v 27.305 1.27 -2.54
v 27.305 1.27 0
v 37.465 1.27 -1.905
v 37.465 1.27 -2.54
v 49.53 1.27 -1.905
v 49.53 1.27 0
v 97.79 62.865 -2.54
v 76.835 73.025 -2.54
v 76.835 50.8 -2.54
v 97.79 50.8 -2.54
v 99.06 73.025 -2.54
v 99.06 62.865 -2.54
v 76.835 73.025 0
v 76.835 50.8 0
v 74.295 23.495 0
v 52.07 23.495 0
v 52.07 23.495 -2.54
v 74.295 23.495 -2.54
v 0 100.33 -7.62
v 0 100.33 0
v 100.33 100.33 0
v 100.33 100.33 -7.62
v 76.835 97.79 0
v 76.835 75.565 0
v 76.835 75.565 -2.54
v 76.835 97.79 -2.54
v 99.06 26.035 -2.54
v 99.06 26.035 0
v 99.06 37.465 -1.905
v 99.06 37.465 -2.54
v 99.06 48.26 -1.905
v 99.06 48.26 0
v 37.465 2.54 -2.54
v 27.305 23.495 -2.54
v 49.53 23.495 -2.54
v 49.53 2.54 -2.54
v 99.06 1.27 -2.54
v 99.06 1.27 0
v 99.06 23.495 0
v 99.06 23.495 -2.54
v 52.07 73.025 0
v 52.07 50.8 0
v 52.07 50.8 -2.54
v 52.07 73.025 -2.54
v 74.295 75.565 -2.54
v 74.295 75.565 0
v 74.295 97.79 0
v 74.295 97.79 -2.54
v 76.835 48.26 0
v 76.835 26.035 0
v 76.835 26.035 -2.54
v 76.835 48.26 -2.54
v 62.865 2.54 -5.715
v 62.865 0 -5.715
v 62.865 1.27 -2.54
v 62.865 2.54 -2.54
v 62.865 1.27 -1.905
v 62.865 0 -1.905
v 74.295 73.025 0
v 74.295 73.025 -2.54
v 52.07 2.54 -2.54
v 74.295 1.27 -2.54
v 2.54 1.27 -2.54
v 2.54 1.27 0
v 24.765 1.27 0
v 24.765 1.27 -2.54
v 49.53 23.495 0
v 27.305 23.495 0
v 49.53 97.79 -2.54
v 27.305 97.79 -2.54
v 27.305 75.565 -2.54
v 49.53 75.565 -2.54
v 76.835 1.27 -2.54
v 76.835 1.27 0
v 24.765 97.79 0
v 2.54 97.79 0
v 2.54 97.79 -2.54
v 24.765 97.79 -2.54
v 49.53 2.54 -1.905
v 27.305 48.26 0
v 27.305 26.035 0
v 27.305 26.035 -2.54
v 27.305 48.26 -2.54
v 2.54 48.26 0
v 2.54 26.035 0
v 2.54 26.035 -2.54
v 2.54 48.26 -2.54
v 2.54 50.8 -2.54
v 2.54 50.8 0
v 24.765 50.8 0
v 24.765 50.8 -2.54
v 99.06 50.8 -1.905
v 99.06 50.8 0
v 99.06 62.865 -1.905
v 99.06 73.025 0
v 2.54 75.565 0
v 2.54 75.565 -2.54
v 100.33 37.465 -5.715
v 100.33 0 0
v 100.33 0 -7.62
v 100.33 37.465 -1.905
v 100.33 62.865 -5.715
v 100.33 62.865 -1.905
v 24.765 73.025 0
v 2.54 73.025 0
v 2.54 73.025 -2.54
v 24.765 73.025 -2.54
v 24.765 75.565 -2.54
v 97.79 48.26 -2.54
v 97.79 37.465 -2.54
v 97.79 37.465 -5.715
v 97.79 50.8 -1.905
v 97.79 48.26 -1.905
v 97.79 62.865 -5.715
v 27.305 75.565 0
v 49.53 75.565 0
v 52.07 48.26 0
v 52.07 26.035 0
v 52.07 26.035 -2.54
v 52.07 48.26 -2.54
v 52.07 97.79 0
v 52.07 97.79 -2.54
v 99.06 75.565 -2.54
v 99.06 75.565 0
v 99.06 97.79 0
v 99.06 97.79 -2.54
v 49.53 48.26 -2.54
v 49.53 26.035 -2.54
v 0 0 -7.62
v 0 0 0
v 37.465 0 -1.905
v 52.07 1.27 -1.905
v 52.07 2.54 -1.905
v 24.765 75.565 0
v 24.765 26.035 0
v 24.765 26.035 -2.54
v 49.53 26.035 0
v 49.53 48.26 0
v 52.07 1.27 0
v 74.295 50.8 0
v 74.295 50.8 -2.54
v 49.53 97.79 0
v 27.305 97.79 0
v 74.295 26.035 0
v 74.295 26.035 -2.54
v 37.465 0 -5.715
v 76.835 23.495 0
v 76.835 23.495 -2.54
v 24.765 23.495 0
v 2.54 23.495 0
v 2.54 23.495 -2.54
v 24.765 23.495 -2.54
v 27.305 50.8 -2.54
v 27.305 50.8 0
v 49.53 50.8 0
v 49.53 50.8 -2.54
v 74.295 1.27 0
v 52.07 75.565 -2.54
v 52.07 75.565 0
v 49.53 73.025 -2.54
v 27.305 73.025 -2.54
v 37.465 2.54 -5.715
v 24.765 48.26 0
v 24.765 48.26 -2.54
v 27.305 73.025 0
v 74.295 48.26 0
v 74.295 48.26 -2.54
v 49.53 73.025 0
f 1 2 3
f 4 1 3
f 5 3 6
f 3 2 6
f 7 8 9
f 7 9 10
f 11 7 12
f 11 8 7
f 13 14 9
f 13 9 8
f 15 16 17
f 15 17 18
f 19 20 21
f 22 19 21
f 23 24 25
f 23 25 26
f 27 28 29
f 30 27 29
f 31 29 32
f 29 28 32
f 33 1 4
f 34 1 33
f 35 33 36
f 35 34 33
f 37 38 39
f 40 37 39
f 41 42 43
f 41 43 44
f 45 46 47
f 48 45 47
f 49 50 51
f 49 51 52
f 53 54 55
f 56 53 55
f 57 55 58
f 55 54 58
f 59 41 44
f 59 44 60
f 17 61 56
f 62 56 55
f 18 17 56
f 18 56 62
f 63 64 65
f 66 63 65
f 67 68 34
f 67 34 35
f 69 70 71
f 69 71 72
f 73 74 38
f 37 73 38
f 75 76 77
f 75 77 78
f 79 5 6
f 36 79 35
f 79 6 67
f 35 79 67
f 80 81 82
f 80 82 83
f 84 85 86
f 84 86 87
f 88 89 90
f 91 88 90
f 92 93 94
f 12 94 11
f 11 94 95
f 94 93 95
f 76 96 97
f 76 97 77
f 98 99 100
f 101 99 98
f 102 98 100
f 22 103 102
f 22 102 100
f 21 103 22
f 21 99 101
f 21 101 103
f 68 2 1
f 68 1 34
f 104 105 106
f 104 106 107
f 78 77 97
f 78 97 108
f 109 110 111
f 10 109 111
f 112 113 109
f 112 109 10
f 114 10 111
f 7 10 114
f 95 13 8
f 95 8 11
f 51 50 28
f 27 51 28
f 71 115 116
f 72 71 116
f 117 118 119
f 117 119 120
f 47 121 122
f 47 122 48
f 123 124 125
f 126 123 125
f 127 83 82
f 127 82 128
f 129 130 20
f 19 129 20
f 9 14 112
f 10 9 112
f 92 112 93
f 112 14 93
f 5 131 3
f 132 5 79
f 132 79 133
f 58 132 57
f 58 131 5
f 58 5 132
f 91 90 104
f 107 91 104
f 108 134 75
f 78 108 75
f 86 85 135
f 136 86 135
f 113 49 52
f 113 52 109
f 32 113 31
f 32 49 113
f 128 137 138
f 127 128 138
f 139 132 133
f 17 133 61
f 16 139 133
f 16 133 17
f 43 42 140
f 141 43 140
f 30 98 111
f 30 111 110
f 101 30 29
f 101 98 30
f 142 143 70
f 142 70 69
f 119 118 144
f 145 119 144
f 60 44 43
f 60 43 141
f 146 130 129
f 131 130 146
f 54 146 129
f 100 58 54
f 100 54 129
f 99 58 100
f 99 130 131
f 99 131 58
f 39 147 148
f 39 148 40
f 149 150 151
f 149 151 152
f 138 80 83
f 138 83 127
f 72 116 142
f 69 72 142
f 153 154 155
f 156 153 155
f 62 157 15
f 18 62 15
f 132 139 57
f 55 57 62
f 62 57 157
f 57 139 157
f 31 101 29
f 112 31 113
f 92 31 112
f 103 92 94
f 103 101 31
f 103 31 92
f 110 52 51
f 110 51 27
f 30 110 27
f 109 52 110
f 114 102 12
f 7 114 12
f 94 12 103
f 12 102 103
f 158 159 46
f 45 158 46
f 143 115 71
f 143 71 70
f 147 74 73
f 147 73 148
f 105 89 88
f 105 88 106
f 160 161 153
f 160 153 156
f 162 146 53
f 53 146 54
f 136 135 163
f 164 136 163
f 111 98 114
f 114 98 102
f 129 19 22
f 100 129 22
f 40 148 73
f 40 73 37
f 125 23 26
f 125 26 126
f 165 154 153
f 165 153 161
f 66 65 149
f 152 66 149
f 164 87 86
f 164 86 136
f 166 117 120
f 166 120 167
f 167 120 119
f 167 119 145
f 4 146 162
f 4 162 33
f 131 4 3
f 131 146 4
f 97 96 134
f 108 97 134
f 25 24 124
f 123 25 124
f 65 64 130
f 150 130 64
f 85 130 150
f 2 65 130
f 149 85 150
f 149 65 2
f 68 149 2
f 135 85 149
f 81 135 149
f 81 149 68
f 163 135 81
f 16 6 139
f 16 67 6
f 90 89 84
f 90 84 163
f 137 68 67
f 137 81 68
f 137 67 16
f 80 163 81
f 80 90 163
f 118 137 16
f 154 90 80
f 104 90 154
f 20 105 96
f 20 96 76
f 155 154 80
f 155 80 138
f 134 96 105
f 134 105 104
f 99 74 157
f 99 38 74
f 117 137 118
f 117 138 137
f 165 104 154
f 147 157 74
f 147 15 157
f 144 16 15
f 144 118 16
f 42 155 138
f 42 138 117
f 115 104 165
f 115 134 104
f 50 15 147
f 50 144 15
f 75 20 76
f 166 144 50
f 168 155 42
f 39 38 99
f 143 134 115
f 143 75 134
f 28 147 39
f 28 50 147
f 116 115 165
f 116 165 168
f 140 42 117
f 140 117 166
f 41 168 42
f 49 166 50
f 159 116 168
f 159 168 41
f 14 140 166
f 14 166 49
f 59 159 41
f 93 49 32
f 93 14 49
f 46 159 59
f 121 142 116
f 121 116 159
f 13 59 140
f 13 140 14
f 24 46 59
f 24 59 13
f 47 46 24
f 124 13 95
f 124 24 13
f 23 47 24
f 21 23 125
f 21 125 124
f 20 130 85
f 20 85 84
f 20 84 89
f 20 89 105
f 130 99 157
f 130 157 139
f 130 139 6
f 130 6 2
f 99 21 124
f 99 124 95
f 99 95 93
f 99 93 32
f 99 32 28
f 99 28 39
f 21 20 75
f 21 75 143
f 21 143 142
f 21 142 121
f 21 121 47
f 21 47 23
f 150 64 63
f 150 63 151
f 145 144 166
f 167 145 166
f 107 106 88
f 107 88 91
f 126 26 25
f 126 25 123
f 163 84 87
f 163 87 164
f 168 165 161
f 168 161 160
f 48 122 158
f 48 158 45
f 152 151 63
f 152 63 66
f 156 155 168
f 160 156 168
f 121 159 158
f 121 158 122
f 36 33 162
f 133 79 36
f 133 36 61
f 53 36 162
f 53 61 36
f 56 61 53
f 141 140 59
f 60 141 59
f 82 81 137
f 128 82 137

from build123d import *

# Parameters (mm, degrees)
F0_W     = 100.33
F0_H     = 100.33
F1_DEPTH = 7.62
F2_W     = 22.225
F2_H     = 22.225
F3_DEPTH = 2.54
F4_W     = 25.4
F4_H     = 3.81
F6_DEPTH = 2.54
F5_W     = 25.4
F5_H     = 3.81
F7_DEPTH = 2.54


with BuildPart() as f1:
    # F0 (on Top) → F1 (new body)
    with BuildSketch(Plane.XY):
        with Locations((50.165, 50.165)):
            Rectangle(F0_W, F0_H)
    extrude(amount=-F1_DEPTH)

    # F2 (on Top) → F3 (cut)
    with BuildSketch(Plane.XY):
        with Locations((13.6525, 86.6775)):
            Rectangle(F2_W, F2_H)
        with Locations((38.4175, 86.6775)):
            Rectangle(F2_W, F2_H)
        with Locations((63.1825, 86.6775)):
            Rectangle(F2_W, F2_H)
        with Locations((87.9475, 86.6775)):
            Rectangle(F2_W, F2_H)
        with Locations((13.6525, 61.9125)):
            Rectangle(F2_W, F2_H)
        with Locations((13.6525, 37.1475)):
            Rectangle(F2_W, F2_H)
        with Locations((13.6525, 12.3825)):
            Rectangle(F2_W, F2_H)
        with Locations((38.4175, 61.9125)):
            Rectangle(F2_W, F2_H)
        with Locations((63.1825, 61.9125)):
            Rectangle(F2_W, F2_H)
        with Locations((87.9475, 61.9125)):
            Rectangle(F2_W, F2_H)
        with Locations((38.4175, 37.1475)):
            Rectangle(F2_W, F2_H)
        with Locations((38.4175, 12.3825)):
            Rectangle(F2_W, F2_H)
        with Locations((63.1825, 37.1475)):
            Rectangle(F2_W, F2_H)
        with Locations((87.9475, 37.1475)):
            Rectangle(F2_W, F2_H)
        with Locations((63.1825, 12.3825)):
            Rectangle(F2_W, F2_H)
        with Locations((87.9475, 12.3825)):
            Rectangle(F2_W, F2_H)
    extrude(amount=-F3_DEPTH, mode=Mode.SUBTRACT)

    # F4 (on face) → F6 (cut)
    with BuildSketch(Plane.XZ):
        with Locations((50.165, -3.81)):
            Rectangle(F4_W, F4_H)
    extrude(amount=-F6_DEPTH, mode=Mode.SUBTRACT)

    # F5 (on face) → F7 (cut)
    with BuildSketch(Plane.YZ.offset(100.33)):
        with Locations((50.165, -3.81)):
            Rectangle(F5_W, F5_H)
    extrude(amount=-F7_DEPTH, mode=Mode.SUBTRACT)


solid = f1.part
